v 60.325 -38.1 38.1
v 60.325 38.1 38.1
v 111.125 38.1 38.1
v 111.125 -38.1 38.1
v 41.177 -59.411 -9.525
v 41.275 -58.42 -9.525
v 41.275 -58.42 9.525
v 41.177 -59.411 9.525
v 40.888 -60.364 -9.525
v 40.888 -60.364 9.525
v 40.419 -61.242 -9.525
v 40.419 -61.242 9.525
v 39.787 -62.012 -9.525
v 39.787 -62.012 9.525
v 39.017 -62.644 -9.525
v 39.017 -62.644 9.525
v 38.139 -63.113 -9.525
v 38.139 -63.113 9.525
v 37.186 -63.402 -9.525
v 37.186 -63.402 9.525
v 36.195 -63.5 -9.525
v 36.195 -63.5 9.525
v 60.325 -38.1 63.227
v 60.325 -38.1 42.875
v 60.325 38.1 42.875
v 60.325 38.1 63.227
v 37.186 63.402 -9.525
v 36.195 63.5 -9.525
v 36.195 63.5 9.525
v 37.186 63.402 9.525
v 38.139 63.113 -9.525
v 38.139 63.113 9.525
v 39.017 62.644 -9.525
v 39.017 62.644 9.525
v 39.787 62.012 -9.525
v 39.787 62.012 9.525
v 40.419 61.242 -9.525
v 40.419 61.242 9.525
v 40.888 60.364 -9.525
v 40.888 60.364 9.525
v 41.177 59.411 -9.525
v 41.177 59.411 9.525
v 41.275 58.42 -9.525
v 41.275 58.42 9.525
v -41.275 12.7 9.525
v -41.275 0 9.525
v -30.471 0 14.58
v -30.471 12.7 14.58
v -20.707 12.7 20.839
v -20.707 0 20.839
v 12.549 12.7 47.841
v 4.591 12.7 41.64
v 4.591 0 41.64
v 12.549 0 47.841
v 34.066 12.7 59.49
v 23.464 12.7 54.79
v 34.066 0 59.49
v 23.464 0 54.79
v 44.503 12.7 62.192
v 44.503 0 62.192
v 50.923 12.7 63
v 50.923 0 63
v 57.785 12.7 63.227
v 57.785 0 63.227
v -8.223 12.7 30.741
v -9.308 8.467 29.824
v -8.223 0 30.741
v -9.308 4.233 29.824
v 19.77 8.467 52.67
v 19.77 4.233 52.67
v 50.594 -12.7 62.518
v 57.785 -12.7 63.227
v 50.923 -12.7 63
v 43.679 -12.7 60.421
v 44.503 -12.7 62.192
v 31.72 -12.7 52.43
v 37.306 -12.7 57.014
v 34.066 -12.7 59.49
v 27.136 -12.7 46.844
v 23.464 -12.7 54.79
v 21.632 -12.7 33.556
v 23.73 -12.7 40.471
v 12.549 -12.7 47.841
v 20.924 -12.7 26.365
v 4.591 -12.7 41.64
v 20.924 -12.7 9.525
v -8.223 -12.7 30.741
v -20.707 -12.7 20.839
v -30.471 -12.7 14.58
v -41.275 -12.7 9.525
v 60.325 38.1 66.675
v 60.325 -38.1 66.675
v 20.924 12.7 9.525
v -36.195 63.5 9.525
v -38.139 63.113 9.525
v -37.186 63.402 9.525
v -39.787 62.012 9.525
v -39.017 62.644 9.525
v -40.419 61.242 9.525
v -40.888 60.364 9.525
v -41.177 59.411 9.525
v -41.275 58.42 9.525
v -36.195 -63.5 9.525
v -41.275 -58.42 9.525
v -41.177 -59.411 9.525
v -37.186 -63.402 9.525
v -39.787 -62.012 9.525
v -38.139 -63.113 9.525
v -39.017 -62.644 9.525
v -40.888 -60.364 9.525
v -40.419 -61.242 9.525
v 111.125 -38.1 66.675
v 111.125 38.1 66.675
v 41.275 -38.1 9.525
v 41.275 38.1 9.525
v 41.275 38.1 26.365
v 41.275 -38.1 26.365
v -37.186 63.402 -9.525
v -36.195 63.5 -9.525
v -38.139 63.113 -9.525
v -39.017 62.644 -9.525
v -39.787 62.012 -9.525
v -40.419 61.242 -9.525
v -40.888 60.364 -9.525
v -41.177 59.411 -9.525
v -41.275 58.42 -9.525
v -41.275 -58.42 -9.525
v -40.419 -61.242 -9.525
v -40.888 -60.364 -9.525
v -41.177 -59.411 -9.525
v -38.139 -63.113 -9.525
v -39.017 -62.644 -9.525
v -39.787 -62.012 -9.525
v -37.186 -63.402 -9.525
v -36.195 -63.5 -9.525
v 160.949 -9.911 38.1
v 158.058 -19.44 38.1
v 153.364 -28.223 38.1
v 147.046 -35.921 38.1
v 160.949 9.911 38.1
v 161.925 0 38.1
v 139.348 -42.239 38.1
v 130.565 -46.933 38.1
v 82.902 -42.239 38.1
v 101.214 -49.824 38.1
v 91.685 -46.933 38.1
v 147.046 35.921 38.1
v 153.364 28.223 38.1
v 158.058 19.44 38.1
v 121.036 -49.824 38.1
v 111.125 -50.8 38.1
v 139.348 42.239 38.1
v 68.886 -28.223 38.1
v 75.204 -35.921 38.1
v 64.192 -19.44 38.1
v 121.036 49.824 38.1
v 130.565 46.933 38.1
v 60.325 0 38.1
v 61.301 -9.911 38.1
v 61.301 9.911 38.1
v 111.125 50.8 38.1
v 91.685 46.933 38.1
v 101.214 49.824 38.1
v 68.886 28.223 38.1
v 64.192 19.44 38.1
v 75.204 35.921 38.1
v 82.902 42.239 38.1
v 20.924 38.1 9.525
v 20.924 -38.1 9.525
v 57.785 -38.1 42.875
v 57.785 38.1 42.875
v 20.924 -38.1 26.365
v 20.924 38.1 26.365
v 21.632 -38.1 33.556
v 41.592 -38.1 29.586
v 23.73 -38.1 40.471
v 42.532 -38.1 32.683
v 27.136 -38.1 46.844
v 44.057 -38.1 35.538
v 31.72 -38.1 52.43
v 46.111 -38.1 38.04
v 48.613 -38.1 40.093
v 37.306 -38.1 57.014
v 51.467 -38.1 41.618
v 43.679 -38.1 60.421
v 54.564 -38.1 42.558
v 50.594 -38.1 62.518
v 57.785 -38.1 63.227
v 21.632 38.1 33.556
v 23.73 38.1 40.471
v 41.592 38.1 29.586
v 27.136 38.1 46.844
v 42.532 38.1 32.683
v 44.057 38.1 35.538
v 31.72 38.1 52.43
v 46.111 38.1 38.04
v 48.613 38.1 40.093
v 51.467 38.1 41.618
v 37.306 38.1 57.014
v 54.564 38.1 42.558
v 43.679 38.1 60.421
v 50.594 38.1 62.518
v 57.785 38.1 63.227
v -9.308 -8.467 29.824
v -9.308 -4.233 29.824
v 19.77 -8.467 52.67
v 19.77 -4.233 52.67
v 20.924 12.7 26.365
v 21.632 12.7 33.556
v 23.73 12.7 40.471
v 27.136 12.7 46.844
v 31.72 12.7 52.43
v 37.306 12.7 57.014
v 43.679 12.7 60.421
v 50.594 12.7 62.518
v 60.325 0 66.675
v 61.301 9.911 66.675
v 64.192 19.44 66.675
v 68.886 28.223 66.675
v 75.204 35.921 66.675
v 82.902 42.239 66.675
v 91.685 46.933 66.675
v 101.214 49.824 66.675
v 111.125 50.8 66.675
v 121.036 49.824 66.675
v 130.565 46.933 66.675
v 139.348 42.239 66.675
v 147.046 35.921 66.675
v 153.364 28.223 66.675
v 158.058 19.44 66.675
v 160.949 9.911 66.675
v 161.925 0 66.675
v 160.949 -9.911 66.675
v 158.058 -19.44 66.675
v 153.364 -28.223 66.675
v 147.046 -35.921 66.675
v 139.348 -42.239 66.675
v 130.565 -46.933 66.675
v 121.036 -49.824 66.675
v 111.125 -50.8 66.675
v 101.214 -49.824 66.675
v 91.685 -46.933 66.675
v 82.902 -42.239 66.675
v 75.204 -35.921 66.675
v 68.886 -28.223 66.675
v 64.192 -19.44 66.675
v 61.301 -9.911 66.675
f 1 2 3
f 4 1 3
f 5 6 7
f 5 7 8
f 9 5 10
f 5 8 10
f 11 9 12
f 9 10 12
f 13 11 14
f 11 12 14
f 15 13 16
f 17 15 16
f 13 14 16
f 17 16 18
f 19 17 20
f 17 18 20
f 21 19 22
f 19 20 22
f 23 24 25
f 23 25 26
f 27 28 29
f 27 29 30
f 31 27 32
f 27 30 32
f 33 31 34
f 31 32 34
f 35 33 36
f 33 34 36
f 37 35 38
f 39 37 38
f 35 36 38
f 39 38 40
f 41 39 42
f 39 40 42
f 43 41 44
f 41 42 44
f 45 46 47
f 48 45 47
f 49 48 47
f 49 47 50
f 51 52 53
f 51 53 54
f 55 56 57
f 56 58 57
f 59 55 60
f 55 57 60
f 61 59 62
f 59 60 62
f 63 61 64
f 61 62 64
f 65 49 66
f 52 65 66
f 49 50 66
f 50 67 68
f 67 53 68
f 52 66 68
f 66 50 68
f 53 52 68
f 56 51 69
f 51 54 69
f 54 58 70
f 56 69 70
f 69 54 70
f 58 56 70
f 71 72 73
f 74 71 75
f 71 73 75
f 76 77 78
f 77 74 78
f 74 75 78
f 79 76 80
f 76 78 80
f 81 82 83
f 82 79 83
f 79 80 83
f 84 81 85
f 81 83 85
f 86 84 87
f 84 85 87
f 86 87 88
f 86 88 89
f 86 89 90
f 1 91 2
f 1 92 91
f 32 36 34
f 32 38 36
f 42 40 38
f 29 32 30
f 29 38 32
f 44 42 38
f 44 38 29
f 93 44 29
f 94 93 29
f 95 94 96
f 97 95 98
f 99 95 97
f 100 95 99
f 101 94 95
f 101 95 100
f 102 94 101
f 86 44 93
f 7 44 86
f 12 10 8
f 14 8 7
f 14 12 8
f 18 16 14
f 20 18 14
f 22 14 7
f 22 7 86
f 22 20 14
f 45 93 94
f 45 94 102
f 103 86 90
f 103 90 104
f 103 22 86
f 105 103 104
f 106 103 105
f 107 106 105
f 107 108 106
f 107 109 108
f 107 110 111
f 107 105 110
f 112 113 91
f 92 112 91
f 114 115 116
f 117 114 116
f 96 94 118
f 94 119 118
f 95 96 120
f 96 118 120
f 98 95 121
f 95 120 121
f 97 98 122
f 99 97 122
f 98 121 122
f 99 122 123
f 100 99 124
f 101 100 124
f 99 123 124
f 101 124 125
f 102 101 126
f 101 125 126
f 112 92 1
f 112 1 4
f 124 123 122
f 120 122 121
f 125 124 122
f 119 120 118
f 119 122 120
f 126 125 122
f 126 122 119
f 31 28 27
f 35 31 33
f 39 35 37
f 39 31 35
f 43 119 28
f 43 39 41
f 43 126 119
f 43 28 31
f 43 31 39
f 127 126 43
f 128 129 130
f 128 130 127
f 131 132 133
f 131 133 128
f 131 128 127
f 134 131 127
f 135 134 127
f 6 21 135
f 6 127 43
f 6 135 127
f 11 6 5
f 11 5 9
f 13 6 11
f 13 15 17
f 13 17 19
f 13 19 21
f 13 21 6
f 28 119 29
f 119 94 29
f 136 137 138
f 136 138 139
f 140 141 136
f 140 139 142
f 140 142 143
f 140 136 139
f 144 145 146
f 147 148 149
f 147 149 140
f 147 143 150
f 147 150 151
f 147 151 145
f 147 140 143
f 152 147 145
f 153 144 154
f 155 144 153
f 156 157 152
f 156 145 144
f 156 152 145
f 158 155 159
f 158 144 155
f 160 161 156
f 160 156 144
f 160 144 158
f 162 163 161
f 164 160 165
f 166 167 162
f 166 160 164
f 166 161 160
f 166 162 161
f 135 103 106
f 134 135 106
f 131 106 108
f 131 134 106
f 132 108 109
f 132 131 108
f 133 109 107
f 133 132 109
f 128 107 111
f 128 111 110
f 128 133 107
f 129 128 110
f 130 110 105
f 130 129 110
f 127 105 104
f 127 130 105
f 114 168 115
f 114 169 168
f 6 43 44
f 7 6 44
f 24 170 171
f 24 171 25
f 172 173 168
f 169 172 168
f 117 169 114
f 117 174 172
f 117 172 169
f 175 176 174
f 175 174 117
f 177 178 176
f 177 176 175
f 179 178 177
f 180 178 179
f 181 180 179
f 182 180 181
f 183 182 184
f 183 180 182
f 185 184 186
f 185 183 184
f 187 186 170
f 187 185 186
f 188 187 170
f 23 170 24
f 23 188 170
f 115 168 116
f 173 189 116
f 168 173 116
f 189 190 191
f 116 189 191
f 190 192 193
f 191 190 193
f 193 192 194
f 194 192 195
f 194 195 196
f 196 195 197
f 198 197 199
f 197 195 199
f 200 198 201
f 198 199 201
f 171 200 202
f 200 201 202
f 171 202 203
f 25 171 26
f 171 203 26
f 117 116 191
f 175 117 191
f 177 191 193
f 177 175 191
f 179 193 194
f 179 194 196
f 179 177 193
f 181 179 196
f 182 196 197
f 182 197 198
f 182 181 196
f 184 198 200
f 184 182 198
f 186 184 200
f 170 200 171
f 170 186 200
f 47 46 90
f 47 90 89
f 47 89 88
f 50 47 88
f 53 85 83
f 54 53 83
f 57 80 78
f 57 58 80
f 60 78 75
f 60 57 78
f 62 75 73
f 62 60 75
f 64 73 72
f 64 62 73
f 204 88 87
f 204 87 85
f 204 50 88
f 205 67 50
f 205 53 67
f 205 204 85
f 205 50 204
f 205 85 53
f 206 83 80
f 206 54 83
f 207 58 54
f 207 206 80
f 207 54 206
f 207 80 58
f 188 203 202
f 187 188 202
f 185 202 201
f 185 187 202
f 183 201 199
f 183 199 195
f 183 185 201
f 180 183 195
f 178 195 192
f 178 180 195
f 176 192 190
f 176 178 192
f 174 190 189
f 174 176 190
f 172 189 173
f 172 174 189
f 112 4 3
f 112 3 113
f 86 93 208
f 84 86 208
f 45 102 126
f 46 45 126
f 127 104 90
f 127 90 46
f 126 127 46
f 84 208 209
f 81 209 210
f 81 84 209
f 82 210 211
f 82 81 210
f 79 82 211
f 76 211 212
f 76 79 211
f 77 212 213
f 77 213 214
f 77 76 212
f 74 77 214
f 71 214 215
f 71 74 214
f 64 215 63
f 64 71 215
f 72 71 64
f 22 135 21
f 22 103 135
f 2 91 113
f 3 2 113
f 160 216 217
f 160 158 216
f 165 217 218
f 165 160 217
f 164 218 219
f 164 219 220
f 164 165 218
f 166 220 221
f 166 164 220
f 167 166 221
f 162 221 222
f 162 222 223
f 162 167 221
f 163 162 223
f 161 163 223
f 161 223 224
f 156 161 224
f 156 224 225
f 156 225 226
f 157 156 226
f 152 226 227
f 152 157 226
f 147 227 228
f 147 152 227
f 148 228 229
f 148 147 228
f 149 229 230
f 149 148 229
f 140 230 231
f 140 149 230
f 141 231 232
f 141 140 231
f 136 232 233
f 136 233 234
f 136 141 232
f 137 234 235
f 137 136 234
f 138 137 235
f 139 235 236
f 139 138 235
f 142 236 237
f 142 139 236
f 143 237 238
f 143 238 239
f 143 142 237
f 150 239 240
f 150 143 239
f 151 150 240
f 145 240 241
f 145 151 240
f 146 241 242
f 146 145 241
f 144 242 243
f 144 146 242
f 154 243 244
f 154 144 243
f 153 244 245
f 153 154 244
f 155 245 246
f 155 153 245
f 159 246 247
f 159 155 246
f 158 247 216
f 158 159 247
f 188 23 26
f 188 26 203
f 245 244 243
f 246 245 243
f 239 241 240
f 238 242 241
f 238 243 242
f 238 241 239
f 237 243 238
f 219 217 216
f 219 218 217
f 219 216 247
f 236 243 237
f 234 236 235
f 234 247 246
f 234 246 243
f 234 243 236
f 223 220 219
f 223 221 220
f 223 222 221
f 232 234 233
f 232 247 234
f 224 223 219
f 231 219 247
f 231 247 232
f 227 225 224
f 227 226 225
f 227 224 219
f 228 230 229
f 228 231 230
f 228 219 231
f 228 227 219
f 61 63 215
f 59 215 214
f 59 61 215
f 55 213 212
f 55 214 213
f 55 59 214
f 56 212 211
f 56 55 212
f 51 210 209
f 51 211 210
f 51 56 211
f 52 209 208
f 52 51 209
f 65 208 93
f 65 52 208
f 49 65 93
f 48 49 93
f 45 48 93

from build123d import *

# Parameters (mm, degrees)
F1_DEPTH = 12.7
F2_DEPTH = 63.5
F3_DEPTH = 38.1
F4_DEPTH = 38.1
F6_R     = 5.08


with BuildPart() as f1:
    # F0 (on Front) → F1 (new body, symmetric)
    with BuildSketch(Plane.XZ):
        with BuildLine():
            add(Edge.make_bspline(
                [(-41.275, 9.525), (-3.920519, 23.604654), (11.358957, 63.75964), (57.785, 63.22654)],
                knots=[0, 0, 0, 0, 112.679807, 112.679807, 112.679807, 112.679807], degree=3))
            Line((-41.275, 9.525), (20.92366, 9.525))
            Line((20.92366, 9.525), (20.92366, 26.3652))
            ThreePointArc((20.92366, 26.3652), (31.720097, 52.430103), (57.785, 63.22654))
        make_face()
    extrude(amount=F1_DEPTH, both=True)

    # F0 (on Front) → F2 (join, symmetric)
    with BuildSketch(Plane.XZ):
        Polygon((-41.275, -9.525), (41.275, -9.525), (41.275, 9.525), (20.92366, 9.525), (-41.275, 9.525), align=None)
    extrude(amount=F2_DEPTH, both=True)

    # F6
    f6_edges = [f1.edges().sort_by_distance(p)[0] for p in [
        (41.275, -63.5, 0),
        (-41.275, -63.5, 0),
        (-41.275, 63.5, 0),
        (41.275, 63.5, 0),
    ]]
    fillet(f6_edges, radius=F6_R)


with BuildPart() as f3:
    # F0 (on Front) → F3 (new body, symmetric)
    with BuildSketch(Plane.XZ):
        Polygon((60.325, 66.675), (60.325, 63.22654), (60.325, 42.8752), (60.325, 38.1), (111.125, 38.1), (111.125, 66.675), align=None)
    extrude(amount=F3_DEPTH, both=True)


with BuildPart() as f4:
    # F0 (on Front) → F4 (new body, symmetric)
    with BuildSketch(Plane.XZ):
        with BuildLine():
            Line((20.92366, 9.525), (41.275, 9.525))
            Line((41.275, 9.525), (41.275, 26.3652))
            ThreePointArc((41.275, 26.3652), (46.110667, 38.039533), (57.785, 42.8752))
            Line((57.785, 42.8752), (60.325, 42.8752))
            Line((60.325, 42.8752), (60.325, 63.22654))
            Line((60.325, 63.22654), (57.785, 63.22654))
            ThreePointArc((57.785, 63.22654), (31.720097, 52.430103), (20.92366, 26.3652))
            Line((20.92366, 26.3652), (20.92366, 9.525))
        make_face()
    extrude(amount=F4_DEPTH, both=True)


with BuildPart() as f5:
    # F0 (on Front) → F5 (revolve)
    with BuildSketch(Plane.XZ):
        Polygon((60.325, 66.675), (60.325, 63.22654), (60.325, 42.8752), (60.325, 38.1), (111.125, 38.1), (111.125, 66.675), align=None)
    revolve(axis=Axis((111.125, 0, 52.3875), (0, 0, -1)))


solid = Compound([f1.part, f3.part, f4.part, f5.part])
